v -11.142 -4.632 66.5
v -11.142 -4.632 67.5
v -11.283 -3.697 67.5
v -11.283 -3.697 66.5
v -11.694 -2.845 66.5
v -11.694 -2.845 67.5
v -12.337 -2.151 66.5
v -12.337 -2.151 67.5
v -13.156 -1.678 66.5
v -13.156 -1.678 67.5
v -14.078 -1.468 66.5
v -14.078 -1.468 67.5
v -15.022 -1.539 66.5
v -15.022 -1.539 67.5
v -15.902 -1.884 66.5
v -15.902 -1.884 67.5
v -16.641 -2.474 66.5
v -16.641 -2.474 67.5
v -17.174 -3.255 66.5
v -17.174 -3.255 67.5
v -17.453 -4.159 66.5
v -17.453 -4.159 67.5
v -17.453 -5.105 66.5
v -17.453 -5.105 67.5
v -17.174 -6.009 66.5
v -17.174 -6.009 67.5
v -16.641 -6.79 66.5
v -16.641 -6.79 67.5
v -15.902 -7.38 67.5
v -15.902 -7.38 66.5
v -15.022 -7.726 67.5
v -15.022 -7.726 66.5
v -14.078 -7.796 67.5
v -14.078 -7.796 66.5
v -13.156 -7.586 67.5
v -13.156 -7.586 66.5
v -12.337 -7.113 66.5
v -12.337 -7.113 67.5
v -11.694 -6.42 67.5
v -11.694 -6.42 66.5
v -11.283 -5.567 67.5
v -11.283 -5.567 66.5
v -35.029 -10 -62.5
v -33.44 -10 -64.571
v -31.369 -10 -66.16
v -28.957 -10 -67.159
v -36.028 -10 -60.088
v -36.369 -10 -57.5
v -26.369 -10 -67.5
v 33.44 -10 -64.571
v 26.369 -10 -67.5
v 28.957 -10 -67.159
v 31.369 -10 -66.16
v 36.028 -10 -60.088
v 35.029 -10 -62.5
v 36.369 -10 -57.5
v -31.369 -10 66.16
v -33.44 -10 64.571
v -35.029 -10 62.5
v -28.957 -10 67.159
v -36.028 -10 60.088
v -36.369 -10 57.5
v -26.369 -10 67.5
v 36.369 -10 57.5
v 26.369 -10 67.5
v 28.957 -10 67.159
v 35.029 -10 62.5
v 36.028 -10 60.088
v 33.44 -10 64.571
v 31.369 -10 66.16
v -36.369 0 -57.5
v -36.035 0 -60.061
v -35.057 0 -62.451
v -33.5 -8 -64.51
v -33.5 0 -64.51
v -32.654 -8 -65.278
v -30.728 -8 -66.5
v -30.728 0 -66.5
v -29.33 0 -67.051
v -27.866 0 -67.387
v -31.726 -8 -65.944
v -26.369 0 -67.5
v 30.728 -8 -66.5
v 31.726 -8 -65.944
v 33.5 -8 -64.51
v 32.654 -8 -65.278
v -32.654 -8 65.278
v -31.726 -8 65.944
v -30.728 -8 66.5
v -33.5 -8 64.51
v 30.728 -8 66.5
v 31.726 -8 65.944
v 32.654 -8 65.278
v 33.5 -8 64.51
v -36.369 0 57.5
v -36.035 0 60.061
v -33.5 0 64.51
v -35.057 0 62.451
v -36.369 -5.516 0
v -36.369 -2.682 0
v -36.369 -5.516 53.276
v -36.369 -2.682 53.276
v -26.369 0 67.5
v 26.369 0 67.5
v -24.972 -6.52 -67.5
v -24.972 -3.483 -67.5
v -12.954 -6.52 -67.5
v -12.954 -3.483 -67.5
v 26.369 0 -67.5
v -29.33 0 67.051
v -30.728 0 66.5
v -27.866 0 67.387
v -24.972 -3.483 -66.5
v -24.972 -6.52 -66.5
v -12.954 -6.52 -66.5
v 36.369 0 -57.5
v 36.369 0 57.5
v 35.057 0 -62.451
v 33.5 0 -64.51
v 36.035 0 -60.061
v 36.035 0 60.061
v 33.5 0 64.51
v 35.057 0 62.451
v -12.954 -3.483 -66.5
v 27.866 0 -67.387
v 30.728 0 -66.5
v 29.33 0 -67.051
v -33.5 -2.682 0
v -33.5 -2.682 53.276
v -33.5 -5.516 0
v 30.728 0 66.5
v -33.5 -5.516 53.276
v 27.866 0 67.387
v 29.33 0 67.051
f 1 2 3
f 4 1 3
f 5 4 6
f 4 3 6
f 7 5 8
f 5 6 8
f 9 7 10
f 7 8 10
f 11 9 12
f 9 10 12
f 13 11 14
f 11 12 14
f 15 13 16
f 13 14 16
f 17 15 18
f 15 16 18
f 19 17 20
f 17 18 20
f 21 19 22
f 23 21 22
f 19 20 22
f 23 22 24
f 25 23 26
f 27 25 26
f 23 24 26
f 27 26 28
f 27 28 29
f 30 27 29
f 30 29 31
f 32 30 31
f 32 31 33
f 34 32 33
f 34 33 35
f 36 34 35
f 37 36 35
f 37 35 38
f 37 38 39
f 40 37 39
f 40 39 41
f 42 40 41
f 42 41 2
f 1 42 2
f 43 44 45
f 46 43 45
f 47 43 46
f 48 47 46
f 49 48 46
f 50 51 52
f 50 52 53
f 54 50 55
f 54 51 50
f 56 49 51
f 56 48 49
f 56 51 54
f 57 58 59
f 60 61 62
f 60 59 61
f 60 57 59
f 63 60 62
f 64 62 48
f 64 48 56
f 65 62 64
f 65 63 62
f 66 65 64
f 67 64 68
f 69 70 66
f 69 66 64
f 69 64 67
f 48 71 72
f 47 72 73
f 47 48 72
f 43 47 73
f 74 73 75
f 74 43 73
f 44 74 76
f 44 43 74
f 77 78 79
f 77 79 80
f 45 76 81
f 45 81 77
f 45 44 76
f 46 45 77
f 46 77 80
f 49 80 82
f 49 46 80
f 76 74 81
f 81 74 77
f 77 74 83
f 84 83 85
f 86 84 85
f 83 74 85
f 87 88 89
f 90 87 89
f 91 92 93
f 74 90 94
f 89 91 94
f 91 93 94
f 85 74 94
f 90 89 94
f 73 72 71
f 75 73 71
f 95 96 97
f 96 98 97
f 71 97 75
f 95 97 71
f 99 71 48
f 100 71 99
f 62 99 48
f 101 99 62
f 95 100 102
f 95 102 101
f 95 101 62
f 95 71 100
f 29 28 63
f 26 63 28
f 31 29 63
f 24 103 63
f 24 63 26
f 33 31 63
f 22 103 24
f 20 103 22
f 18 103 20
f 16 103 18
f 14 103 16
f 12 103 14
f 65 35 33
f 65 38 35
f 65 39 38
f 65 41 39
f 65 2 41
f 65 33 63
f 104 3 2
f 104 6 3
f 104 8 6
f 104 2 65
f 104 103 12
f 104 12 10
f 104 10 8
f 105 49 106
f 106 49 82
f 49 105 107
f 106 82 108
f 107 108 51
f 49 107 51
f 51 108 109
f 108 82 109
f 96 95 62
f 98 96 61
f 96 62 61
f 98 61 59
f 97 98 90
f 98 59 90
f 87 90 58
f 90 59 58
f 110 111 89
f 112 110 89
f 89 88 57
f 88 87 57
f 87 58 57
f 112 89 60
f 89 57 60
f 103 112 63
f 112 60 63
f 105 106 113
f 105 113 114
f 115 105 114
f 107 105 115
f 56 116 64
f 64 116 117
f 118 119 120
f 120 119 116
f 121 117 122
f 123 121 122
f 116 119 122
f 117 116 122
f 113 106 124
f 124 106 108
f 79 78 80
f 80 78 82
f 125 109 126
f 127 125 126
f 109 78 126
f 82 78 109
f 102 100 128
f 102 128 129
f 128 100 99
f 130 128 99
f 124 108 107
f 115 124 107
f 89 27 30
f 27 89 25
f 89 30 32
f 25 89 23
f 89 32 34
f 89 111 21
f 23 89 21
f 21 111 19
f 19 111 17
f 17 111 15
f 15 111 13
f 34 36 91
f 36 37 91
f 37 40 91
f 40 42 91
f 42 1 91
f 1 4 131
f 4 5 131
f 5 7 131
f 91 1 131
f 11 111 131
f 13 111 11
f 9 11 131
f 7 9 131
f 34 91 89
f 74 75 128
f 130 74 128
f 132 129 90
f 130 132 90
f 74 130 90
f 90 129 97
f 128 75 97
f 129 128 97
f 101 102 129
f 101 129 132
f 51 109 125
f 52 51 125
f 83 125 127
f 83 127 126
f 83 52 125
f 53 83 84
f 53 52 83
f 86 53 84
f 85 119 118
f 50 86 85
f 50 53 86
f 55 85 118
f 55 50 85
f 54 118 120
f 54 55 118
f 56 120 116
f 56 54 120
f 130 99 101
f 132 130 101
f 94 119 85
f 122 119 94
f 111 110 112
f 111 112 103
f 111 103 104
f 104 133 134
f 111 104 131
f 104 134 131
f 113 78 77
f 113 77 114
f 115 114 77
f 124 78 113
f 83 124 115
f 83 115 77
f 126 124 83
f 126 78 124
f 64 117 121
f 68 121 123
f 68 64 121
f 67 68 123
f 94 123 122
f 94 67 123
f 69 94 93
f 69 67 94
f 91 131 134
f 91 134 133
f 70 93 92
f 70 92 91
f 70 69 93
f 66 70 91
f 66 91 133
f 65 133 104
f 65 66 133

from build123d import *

# Parameters (mm, degrees)
F0_W      = 72.7374479175
F0_H      = 135
F1_DEPTH  = 10
F2_R      = 10
F3_W      = 67
F3_H      = 133
F4_DEPTH  = 8
F5_W      = 12.0182400569
F5_H      = 3.036568407
F6_DEPTH  = 25
F7_R      = 3.1730919104
F8_DEPTH  = 12
F9_W      = 2.8348967899
F9_H      = 53.2759986818
F10_DEPTH = 12


# Not quite as in the source:
# - a feature of the source that left no trace in its solid (it failed there, or was rolled back) is left out


with BuildPart() as f1:
    # F0 (on Front) → F1 (new body)
    with BuildSketch(Plane.XZ):
        Rectangle(F0_W, F0_H)
    extrude(amount=F1_DEPTH)

    # F2
    f2_edges = [f1.edges().sort_by_distance(p)[0] for p in [
        (36.368724, -5, 67.5),
        (-36.368724, -5, 67.5),
        (-36.368724, -5, -67.5),
        (36.368724, -5, -67.5),
    ]]
    fillet(f2_edges, radius=F2_R)

    # F3 (on Front) → F4 (cut)
    with BuildSketch(Plane.XZ):
        Rectangle(F3_W, F3_H)
    extrude(amount=F4_DEPTH, mode=Mode.SUBTRACT)

    # F5 (on face) → F6 (cut)
    with BuildSketch(Plane(origin=(0, 0, -67.5), x_dir=(1, 0, 0), z_dir=(0, 0, -1))):
        with Locations((-18.9633578993, 5.0012452994)):
            Rectangle(F5_W, F5_H)
    extrude(amount=-F6_DEPTH, mode=Mode.SUBTRACT)

    # F7 (on face) → F8 (cut)
    with BuildSketch(Plane.XY.offset(67.5)):
        with Locations((-14.315456152, -4.6320809051)):
            Circle(F7_R)
    extrude(amount=-F8_DEPTH, mode=Mode.SUBTRACT)

    # F9 (on face) → F10 (cut)
    with BuildSketch(Plane(origin=(-36.3687239587, 0, 0), x_dir=(0, -1, 0), z_dir=(-1, 0, 0))):
        with Locations((4.099019221, 26.6379993409)):
            Rectangle(F9_W, F9_H)
    extrude(amount=-F10_DEPTH, mode=Mode.SUBTRACT)


solid = f1.part
